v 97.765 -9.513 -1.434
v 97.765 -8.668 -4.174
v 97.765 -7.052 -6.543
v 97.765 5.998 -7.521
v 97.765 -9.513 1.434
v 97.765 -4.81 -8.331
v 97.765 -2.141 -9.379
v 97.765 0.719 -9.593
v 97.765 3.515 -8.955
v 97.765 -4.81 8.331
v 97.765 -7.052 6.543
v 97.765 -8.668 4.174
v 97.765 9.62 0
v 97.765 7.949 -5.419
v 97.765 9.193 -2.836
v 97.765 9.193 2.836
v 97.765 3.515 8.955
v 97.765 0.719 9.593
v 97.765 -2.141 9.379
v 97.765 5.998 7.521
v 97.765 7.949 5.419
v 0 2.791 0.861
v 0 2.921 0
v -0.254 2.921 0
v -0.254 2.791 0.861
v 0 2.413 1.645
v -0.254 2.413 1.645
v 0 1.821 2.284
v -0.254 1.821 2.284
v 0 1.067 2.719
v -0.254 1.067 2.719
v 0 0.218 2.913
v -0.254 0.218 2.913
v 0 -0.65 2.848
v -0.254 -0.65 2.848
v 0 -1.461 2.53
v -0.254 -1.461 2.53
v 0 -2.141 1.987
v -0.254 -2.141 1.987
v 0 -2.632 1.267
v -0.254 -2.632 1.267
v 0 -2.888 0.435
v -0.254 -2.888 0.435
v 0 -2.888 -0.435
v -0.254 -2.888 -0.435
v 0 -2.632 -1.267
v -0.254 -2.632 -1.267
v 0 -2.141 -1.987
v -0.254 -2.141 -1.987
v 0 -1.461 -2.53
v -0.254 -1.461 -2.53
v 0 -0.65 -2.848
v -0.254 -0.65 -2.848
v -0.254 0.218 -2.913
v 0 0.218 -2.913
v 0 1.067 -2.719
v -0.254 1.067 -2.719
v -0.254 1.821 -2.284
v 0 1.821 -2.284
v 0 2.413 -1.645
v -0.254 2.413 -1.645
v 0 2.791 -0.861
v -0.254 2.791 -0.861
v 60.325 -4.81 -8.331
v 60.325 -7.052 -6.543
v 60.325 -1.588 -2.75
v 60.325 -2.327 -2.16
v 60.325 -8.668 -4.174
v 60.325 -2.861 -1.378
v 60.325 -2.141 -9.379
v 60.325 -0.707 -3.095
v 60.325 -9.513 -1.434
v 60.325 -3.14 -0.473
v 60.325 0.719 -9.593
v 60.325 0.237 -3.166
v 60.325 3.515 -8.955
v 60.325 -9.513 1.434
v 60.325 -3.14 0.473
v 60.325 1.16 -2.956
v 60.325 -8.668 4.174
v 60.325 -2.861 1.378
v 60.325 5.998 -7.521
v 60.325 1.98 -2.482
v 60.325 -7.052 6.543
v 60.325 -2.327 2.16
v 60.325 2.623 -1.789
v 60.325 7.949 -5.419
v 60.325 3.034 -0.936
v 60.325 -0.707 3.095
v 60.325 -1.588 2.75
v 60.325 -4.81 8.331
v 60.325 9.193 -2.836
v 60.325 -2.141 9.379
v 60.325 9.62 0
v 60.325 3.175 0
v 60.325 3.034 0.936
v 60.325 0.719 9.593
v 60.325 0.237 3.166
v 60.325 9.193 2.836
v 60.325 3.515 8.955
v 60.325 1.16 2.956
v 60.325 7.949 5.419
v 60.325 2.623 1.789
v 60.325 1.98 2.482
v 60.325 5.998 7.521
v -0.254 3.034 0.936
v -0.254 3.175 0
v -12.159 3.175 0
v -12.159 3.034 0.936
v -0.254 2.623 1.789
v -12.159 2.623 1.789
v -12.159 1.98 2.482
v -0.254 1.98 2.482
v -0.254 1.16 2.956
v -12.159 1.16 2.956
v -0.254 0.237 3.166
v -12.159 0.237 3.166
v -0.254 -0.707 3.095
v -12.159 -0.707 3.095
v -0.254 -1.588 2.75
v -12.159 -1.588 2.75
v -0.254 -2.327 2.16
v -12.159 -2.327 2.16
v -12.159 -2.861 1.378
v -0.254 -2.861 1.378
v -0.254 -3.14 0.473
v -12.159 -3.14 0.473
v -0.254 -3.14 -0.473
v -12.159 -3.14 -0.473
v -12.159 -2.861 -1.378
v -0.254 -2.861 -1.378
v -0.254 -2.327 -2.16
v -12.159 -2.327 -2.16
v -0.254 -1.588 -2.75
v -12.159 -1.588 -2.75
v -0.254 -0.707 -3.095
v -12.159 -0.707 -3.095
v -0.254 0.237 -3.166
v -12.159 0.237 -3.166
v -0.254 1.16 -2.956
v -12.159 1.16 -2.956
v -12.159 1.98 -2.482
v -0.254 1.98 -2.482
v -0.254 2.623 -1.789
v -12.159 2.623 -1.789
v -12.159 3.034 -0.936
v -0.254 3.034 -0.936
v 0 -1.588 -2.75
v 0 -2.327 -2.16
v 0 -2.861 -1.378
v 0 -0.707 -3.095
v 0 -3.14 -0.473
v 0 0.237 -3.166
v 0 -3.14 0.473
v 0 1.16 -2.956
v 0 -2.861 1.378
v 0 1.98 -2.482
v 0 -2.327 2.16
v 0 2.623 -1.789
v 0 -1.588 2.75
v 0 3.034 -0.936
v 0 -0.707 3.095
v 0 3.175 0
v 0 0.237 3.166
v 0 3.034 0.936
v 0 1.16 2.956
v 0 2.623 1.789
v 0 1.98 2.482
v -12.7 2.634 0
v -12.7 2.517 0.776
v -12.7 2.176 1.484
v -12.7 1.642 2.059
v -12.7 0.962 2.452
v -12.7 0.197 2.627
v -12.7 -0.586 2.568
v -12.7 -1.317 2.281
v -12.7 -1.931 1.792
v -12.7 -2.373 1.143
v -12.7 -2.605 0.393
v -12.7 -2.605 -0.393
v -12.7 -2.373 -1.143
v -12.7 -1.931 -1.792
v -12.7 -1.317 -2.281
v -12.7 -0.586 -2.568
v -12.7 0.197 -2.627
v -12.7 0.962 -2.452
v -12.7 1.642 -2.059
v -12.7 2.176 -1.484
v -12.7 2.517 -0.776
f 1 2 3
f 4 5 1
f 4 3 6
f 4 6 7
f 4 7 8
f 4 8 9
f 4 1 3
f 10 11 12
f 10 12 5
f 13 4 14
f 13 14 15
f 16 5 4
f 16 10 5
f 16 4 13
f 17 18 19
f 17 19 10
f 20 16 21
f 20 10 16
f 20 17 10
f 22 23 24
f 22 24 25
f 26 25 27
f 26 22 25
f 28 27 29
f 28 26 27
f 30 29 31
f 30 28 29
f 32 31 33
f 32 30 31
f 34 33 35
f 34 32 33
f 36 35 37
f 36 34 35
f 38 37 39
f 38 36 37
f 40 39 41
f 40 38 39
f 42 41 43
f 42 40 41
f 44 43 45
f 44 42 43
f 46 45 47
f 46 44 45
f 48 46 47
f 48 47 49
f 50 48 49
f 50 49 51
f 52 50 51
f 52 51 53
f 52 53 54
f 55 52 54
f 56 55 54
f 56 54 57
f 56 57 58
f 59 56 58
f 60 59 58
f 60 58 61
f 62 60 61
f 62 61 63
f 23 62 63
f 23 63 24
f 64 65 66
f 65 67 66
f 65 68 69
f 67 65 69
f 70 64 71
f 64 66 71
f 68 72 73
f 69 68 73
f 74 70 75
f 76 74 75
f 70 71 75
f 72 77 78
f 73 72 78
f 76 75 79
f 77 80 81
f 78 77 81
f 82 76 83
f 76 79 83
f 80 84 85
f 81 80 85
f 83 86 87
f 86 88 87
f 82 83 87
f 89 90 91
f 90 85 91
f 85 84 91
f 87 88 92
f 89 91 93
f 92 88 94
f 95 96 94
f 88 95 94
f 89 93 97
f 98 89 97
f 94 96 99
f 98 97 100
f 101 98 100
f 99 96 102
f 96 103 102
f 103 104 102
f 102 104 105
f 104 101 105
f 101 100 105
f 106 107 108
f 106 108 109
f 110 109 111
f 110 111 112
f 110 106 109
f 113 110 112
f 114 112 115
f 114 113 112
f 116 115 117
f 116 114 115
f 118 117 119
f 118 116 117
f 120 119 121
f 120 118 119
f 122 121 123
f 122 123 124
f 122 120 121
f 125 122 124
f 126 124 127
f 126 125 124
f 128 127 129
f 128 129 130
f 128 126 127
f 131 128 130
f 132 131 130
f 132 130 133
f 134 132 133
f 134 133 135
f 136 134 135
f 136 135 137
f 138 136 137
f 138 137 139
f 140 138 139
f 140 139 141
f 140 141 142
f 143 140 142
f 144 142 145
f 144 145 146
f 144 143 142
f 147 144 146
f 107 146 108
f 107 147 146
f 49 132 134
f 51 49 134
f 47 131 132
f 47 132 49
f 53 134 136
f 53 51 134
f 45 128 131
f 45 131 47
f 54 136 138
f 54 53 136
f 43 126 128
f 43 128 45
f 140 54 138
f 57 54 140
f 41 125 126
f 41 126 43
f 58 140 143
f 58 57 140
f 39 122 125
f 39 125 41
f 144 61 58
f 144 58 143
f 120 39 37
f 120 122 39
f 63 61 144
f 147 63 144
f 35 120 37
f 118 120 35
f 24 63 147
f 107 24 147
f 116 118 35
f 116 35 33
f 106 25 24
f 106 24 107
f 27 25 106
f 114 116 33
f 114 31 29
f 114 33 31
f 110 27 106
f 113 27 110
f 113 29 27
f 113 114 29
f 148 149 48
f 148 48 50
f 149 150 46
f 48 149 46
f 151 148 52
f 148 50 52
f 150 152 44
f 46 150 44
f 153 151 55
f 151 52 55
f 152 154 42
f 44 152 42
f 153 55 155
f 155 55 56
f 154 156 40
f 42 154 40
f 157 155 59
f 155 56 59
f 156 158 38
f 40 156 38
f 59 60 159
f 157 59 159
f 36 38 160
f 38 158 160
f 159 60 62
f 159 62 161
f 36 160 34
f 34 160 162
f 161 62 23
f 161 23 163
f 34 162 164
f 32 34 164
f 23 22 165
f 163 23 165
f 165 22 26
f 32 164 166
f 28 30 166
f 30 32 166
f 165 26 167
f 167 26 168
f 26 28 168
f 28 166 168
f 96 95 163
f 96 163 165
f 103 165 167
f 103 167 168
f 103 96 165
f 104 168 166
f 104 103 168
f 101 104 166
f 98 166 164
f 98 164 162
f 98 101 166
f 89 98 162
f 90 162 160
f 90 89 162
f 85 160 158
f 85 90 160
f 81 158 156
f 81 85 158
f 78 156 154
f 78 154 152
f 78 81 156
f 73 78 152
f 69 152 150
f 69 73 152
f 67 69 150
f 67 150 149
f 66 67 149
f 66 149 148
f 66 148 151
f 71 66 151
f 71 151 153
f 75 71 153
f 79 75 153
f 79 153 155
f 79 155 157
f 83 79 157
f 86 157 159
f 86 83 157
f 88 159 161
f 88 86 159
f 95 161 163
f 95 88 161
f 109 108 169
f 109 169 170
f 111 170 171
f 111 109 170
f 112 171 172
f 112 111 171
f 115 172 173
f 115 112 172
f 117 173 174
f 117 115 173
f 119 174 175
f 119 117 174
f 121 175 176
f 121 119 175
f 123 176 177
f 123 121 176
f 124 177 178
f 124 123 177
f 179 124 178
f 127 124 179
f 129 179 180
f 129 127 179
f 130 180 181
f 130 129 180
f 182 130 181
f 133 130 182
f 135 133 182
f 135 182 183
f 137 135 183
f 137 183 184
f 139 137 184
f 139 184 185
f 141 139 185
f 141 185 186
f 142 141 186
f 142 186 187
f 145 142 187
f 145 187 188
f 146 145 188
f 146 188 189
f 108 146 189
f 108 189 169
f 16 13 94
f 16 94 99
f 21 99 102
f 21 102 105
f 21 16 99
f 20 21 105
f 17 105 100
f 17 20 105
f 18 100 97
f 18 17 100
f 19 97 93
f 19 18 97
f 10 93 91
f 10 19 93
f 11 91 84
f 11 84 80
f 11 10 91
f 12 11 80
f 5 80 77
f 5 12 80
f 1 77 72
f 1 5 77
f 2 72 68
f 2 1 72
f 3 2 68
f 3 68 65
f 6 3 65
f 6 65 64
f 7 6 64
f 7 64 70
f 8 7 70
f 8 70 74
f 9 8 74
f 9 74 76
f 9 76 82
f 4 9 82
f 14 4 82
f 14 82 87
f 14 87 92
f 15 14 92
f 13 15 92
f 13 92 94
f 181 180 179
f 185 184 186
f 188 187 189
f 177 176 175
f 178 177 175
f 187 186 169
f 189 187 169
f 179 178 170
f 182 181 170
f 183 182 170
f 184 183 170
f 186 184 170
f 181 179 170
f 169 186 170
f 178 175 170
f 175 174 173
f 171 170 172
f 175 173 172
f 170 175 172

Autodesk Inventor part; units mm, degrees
sketch "Sketch_1" plane through (0, 0, 0) normal (0, 0, 1) x (1, 0, 0)
  line L0 (97.7646, 0) -> (0, 0)
  line L1 (0, 0) -> (0, 3.175)
  line L2 (0, 3.175) -> (60.325, 3.175)
  line L3 (60.325, 3.175) -> (60.325, 9.6202)
  line L4 (60.325, 9.6202) -> (97.7646, 9.6202)
  line L5 (97.7646, 9.6202) -> (97.7646, 0)
  line L6 (97.7646, 0) -> (0, 0)
revolve "Revolution1" add sketch "Sketch_1" angle 360 about axis through (97.7646, 0, 0) along (1, 0, 0)
sketch "Sketch_3" plane through (0, 0, 0) normal (0, 0, 1) x (1, 0, 0)
  line L0 (0, 0) -> (-12.7, 0)
  line L1 (-12.7, 0) -> (-12.7, 2.634)
  line L2 (-12.7, 2.634) -> (-12.159, 3.175)
  line L3 (-12.159, 3.175) -> (0, 3.175)
  line L4 (0, 3.175) -> (0, 0)
  line L5 (0, 0) -> (-12.7, 0)
revolve "Revolution2" add sketch "Sketch_3" angle 360 about axis through (0, 0, 0) along (1, 0, 0)
sketch "Sketch_30" plane through (0, 0, 0) normal (0, 0, 1) x (1, 0, 0)
  line L0 (0, 0) -> (-0.254, 0)
  line L1 (-0.254, 2.921) -> (0, 2.921)
  line L2 (0, 2.921) -> (0, 3.429)
  line L3 (0, 3.429) -> (-0.254, 3.429)
  line L4 (-0.254, 3.429) -> (-0.254, 2.921)
revolve "Revolution3" cut sketch "Sketch_30" angle 360 about axis through (0, 0, 0) along (1, 0, 0)
ref_plane "dia1_XY" through (0, 3.175, 0) normal (1, 0, 0) x (0, 0, -1)
ref_plane "dia1_YZ" through (0, 3.175, 0) normal (0, 0, -1) x (0, 1, 0)
ref_plane "dia1_ZX" through (0, 3.175, 0) normal (0, 1, 0) x (1, 0, 0)
ref_plane "dia12_XY" through (0, 0, 10.2235) normal (1, 0, 0) x (0, 0, -1)
ref_plane "dia12_YZ" through (0, 0, 10.2235) normal (0, 0, -1) x (0, 1, 0)
ref_plane "dia12_ZX" through (0, 0, 10.2235) normal (0, 1, 0) x (1, 0, 0)
ref_plane "dia2_XY" through (0, -3.175, 0) normal (1, 0, 0) x (0, 0, -1)
ref_plane "dia2_YZ" through (0, -3.175, 0) normal (0, 0, -1) x (0, 1, 0)
ref_plane "dia2_ZX" through (0, -3.175, 0) normal (0, 1, 0) x (1, 0, 0)
ref_plane "dia22_XY" through (0, 0, -10.2235) normal (1, 0, 0) x (0, 0, -1)
ref_plane "dia22_YZ" through (0, 0, -10.2235) normal (0, 0, -1) x (0, 1, 0)
ref_plane "dia22_ZX" through (0, 0, -10.2235) normal (0, 1, 0) x (1, 0, 0)
ref_plane "rl1_XY" through (-12.7, 0, 0) normal (1, 0, 0) x (0, 0, -1)
ref_plane "rl1_YZ" through (-12.7, 0, 0) normal (0, 0, -1) x (0, 1, 0)
ref_plane "rl1_ZX" through (-12.7, 0, 0) normal (0, 1, 0) x (1, 0, 0)
ref_plane "rl2_XY" through (0, 0, 0) normal (1, 0, 0) x (0, 0, -1)
ref_plane "rl2_YZ" through (0, 0, 0) normal (0, 0, -1) x (0, 1, 0)
ref_plane "rl2_ZX" through (0, 0, 0) normal (0, 1, 0) x (1, 0, 0)
ref_plane "rod_cp_XY" through (0, 0, 0) normal (1, 0, 0) x (0, 0, -1)
ref_plane "rod_cp_YZ" through (0, 0, 0) normal (0, 0, -1) x (0, 1, 0)
ref_plane "rod_cp_ZX" through (0, 0, 0) normal (0, 1, 0) x (1, 0, 0)
ref_plane "thd1_XY" through (-12.7, 3.175, 0) normal (1, 0, 0) x (0, 0, -1)
ref_plane "thd1_YZ" through (-12.7, 3.175, 0) normal (0, 0, -1) x (0, 1, 0)
ref_plane "thd1_ZX" through (-12.7, 3.175, 0) normal (0, 1, 0) x (1, 0, 0)
ref_plane "thd2_XY" through (-12.7, -3.175, 0) normal (1, 0, 0) x (0, 0, -1)
ref_plane "thd2_YZ" through (-12.7, -3.175, 0) normal (0, 0, -1) x (0, 1, 0)
ref_plane "thd2_ZX" through (-12.7, -3.175, 0) normal (0, 1, 0) x (1, 0, 0)
ref_plane "to_rod_clevis_XY" through (-16.764, 0, 0) normal (1, 0, 0) x (0, 0, -1)
ref_plane "to_rod_clevis_YZ" through (-16.764, 0, 0) normal (0, 0, -1) x (0, 1, 0)
ref_plane "to_rod_clevis_ZX" through (-16.764, 0, 0) normal (0, 1, 0) x (1, 0, 0)
properties part number "C-041.50000_rod"
